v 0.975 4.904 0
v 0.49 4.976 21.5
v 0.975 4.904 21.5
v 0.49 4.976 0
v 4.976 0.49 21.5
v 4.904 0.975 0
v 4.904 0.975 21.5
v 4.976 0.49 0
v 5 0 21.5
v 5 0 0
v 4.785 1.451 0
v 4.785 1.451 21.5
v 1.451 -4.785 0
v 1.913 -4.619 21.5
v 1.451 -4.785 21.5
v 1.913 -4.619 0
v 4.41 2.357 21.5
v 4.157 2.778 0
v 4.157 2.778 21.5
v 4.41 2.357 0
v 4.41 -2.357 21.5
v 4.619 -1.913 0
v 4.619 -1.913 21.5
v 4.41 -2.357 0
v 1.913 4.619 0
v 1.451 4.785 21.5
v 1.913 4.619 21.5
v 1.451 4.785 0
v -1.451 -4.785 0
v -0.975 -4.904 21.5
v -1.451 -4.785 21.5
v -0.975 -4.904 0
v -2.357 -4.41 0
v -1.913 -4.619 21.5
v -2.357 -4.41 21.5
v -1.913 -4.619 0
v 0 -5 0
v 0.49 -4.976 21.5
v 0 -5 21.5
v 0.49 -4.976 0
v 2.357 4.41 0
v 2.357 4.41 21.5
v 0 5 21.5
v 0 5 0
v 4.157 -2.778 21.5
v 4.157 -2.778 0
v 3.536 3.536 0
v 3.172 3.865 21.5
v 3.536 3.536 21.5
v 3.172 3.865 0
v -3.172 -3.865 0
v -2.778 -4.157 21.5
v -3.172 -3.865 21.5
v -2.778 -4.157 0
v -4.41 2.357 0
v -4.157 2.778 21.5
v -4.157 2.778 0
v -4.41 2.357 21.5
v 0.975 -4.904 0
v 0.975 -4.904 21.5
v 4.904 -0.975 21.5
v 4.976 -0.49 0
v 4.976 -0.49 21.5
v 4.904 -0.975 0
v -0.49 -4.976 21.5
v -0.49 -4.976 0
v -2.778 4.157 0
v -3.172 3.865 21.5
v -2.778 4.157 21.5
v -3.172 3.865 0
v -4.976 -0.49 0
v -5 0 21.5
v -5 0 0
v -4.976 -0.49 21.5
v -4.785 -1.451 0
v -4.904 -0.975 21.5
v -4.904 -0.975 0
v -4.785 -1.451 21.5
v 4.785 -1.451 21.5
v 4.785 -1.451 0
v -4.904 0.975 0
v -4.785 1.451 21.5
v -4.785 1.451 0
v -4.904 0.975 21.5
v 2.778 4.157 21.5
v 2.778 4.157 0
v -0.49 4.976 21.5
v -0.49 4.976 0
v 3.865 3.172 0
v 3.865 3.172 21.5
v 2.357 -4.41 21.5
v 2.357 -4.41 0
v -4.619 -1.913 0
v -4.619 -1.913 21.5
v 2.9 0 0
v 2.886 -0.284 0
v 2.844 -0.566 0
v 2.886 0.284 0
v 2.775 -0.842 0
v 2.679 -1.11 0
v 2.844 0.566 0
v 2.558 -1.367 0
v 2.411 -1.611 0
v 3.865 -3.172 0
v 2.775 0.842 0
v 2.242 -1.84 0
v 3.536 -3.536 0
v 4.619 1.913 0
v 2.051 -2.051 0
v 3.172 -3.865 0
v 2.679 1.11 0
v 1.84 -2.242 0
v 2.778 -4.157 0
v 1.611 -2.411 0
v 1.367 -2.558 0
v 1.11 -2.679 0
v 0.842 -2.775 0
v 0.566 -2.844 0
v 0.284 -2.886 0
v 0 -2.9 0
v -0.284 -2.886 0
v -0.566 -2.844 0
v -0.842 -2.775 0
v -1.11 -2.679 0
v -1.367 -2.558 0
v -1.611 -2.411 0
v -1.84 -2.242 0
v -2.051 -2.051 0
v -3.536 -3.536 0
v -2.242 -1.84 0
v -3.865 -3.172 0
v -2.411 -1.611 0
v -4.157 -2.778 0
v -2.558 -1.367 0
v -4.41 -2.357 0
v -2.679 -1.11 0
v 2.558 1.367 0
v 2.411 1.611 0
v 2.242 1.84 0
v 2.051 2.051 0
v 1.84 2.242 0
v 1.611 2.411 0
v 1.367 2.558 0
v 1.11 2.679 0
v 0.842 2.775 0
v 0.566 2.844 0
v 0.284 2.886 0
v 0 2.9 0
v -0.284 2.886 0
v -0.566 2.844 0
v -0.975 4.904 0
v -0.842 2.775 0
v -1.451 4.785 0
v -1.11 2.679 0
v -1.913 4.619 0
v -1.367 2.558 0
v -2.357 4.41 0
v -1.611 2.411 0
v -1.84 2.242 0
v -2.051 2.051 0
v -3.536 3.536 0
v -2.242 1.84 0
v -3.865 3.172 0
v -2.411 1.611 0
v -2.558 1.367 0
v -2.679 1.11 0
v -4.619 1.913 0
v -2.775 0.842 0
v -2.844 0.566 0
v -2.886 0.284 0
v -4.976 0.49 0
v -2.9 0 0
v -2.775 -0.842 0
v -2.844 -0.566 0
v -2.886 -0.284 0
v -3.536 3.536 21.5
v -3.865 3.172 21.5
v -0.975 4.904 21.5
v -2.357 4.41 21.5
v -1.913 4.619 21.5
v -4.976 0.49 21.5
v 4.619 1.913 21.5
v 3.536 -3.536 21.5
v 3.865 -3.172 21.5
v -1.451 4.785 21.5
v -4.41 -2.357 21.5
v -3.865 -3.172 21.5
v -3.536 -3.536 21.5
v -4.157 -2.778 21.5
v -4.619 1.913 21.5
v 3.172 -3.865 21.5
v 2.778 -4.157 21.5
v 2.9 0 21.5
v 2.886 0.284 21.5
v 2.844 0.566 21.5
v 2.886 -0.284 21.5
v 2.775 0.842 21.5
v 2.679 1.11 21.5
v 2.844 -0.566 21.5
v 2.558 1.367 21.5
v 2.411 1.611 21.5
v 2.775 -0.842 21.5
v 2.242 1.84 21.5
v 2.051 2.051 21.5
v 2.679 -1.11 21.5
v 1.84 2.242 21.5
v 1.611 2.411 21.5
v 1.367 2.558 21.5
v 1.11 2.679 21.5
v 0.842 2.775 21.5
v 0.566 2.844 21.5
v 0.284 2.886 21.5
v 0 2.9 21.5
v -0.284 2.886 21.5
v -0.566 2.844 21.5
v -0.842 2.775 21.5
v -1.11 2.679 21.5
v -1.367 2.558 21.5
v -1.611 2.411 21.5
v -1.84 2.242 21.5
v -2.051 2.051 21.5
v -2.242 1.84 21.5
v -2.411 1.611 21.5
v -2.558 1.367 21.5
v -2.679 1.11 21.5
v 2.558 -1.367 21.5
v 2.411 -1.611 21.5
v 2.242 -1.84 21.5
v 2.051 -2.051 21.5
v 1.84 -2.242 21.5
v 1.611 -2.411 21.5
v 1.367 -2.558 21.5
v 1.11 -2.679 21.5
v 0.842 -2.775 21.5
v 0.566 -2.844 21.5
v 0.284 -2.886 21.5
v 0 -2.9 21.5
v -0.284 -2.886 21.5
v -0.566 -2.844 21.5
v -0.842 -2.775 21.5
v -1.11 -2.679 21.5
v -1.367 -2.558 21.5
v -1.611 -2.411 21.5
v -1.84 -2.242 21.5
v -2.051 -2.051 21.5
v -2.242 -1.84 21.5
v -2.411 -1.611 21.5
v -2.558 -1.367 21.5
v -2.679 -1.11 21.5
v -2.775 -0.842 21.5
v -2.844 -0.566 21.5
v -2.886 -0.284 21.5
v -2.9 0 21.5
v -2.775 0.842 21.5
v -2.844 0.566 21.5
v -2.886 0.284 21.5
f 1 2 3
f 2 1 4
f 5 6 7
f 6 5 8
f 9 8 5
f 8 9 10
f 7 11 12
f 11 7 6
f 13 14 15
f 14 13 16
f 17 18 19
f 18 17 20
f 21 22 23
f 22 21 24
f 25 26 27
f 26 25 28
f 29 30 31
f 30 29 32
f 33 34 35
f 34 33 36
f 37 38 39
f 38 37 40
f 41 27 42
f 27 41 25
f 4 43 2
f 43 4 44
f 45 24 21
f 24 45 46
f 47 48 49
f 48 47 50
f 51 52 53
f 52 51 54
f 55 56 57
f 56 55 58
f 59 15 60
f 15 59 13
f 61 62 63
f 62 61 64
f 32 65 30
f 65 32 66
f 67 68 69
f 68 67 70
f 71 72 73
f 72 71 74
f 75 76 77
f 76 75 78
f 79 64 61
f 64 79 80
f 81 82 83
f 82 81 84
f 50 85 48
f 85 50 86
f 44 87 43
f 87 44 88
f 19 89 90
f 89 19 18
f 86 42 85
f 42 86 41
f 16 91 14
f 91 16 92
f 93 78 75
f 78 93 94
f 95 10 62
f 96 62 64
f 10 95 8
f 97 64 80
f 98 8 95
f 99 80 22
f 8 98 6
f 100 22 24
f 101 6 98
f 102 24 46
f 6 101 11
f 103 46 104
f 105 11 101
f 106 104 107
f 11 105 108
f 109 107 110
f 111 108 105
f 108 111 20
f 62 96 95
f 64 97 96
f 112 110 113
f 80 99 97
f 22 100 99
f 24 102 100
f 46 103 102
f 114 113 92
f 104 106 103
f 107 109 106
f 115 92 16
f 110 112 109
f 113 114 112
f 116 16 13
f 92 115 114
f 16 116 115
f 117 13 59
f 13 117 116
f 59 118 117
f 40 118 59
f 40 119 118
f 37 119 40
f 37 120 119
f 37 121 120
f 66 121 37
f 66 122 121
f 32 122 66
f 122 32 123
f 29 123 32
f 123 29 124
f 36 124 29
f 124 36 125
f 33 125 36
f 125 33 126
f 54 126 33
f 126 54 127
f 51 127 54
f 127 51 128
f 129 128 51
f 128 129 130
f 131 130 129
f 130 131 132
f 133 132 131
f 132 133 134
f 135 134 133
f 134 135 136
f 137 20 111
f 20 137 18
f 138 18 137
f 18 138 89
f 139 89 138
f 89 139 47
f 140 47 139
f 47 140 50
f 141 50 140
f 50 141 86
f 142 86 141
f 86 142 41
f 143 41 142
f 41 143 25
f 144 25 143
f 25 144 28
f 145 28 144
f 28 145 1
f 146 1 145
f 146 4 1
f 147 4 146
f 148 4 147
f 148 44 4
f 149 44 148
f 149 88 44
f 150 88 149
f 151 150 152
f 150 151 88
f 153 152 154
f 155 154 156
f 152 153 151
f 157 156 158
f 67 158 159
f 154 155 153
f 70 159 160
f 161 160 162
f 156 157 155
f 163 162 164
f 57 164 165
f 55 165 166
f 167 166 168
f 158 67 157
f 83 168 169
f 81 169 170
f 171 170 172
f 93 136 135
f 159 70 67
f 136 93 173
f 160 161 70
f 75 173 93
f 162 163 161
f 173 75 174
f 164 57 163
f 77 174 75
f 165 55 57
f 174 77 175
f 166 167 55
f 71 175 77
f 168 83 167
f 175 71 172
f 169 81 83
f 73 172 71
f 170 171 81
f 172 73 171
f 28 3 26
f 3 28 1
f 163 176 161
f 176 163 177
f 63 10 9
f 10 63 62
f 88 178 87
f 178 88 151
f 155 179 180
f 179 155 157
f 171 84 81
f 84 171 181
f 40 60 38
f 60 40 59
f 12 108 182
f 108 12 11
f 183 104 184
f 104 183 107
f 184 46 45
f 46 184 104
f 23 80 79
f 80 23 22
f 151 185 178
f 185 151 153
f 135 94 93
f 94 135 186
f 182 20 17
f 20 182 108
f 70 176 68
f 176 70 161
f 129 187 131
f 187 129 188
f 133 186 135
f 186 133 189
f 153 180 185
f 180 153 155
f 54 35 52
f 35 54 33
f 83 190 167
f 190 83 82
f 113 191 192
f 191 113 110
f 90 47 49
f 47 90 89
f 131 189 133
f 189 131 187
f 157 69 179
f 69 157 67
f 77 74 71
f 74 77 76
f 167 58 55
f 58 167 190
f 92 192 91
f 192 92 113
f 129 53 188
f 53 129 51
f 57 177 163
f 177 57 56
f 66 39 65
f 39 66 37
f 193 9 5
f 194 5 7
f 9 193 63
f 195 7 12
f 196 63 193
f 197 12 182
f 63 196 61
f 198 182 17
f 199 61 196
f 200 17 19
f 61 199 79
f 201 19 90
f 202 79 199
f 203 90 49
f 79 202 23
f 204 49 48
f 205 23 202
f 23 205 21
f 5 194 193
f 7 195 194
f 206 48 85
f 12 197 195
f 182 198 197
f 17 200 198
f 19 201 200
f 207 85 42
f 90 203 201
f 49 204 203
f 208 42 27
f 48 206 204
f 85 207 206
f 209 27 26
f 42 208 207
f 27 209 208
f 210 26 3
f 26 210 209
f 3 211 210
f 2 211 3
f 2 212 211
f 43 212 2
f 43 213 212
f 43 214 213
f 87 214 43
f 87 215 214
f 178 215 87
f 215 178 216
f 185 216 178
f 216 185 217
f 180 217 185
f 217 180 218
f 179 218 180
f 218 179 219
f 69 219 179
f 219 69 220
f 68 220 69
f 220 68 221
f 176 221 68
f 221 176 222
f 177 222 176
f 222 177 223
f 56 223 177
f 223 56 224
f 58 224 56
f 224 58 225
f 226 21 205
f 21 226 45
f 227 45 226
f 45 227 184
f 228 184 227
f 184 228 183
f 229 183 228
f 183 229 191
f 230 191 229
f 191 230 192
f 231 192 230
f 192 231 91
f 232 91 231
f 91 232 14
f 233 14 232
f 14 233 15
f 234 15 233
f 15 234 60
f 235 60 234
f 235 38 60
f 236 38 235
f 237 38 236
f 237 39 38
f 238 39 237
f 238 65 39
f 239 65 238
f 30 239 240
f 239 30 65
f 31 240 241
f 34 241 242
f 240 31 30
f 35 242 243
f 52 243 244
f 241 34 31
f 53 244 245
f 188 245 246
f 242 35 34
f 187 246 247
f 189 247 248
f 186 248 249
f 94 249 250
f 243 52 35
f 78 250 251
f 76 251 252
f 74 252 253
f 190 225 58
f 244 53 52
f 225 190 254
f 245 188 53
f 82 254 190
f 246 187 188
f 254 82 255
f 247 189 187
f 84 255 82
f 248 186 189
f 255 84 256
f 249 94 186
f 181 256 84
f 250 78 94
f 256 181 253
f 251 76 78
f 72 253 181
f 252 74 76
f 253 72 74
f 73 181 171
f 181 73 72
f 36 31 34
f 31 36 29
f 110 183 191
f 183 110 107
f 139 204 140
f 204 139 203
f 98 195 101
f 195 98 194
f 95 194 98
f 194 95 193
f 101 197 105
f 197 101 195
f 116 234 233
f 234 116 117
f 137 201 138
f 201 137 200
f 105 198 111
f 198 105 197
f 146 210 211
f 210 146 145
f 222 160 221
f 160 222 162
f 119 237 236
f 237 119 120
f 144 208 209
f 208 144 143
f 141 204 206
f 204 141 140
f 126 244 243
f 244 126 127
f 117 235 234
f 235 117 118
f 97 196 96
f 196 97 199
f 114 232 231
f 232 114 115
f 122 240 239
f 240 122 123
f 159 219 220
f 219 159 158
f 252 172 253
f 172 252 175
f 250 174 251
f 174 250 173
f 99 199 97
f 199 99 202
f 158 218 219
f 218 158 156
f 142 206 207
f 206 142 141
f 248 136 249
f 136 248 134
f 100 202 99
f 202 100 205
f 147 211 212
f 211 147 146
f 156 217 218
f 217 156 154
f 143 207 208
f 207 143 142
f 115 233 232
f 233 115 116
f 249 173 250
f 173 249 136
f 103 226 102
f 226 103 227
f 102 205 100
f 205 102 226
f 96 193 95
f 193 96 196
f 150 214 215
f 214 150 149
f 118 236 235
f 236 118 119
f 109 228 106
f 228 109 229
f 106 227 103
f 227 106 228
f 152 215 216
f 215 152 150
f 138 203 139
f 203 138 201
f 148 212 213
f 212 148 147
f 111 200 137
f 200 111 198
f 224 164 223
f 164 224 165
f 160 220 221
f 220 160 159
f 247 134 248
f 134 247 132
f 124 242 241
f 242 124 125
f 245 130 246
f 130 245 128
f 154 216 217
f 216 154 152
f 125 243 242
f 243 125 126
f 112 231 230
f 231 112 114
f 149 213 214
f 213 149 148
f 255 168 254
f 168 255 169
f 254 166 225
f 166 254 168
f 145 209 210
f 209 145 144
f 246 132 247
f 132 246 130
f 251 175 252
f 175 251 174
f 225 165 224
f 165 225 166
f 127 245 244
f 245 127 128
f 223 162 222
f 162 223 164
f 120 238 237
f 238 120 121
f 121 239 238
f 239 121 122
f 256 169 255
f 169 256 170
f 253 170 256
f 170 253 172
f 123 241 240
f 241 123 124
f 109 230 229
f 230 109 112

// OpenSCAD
// file: cell_brace_001.scad
// cell_brace_001.scad
// Mid-span cell brace for the 20s5p pack (mates with battery_holder_004).
// The end plates grip only 10mm of each cell end, leaving 51mm of cell
// unsupported — this brace ties the cells together at mid-height.
//
// Two parts:
//   brace  — 5x4 plate matching a holder section (print 5). Through-holes
//            at 27.2mm slide over the cells during assembly (cells first,
//            then brace, then top plates). Same dovetails as the holder
//            sections so braces tile at the same seams; same M5 rod
//            positions so the through-rods pass through.
//   sleeve — rod spacer tube, 21.5mm (print 40: one above and one below
//            the brace on each of the 20 rods). Sleeves locate the brace
//            at mid-span AND act as compression limiters: the clamp path
//            becomes plate->sleeve->brace->sleeve->plate, totalling
//            exactly 12 + 21.5 + 8 + 21.5 + 12 = 75mm = the cell stack,
//            so rod torque can't crush the cells.
//
// part = "brace" | "sleeve" | "both"

part = "both";

$fn = 64;

// ---- Shared with battery_holder_004 ----
pitch    = 28;
cols     = 5;
rows     = 4;
margin_x = 3;
plate_x  = cols*pitch + 2*margin_x;   // 146
plate_y  = rows*pitch;                // 112
bolt_d   = 5.8;    // slightly loose — the sleeves do the aligning

dt_root  = 6;
dt_tip   = 9;
dt_len   = 3.2;
dt_slop  = 0.2;
dt_xs    = [margin_x + 2*pitch, margin_x + 3*pitch];

// ---- Brace ----
brace_h  = 8;
hole_d   = 27.2;   // extra clearance: slides 35mm down over 20 cells
chamfer  = 1.2;    // lead-in, both faces

// ---- Sleeve ----
sleeve_od = 10;
sleeve_id = 5.8;
sleeve_l  = 21.5;  // (75 - 8 - 2*12) / 2

function cx(i) = margin_x + pitch/2 + i*pitch;
function cy(j) = pitch/2 + j*pitch;

module dovetail(root, tip, len, h) {
    linear_extrude(h)
        polygon([[-root/2, 0], [root/2, 0], [tip/2, len], [-tip/2, len]]);
}

module brace() {
    difference() {
        union() {
            cube([plate_x, plate_y, brace_h]);
            for (x = dt_xs)
                translate([x, plate_y - 0.01, 0])
                    dovetail(dt_root, dt_tip, dt_len + 0.01, brace_h);
        }

        for (x = dt_xs)
            translate([x, -0.01, -1])
                dovetail(dt_root + 2*dt_slop, dt_tip + 2*dt_slop,
                         dt_len + 0.2, brace_h + 2);

        // cell through-holes with lead-in chamfers on both faces
        for (i = [0:cols-1], j = [0:rows-1]) {
            translate([cx(i), cy(j), -1])
                cylinder(d=hole_d, h=brace_h + 2);
            translate([cx(i), cy(j), -0.01])
                cylinder(d1=hole_d + 2*chamfer, d2=hole_d, h=chamfer);
            translate([cx(i), cy(j), brace_h - chamfer + 0.01])
                cylinder(d1=hole_d, d2=hole_d + 2*chamfer, h=chamfer);
        }

        // M5 through-rod holes at the corner interstices
        for (a = [0, cols-2], b = [0, rows-2])
            translate([cx(a) + pitch/2, cy(b) + pitch/2, -1])
                cylinder(d=bolt_d, h=brace_h + 2);
    }
}

module sleeve() {
    difference() {
        cylinder(d=sleeve_od, h=sleeve_l);
        translate([0, 0, -1]) cylinder(d=sleeve_id, h=sleeve_l + 2);
    }
}

if (part == "brace") brace();
else if (part == "sleeve") sleeve();
else {
    brace();
    for (k = [0:7])
        translate([12 + k*16, -18, 0]) sleeve();
}
// main file
// Rod spacer sleeve — print 40 (2 per rod). See cell_brace_001.scad.
use <cell_brace_001.scad>
sleeve();
